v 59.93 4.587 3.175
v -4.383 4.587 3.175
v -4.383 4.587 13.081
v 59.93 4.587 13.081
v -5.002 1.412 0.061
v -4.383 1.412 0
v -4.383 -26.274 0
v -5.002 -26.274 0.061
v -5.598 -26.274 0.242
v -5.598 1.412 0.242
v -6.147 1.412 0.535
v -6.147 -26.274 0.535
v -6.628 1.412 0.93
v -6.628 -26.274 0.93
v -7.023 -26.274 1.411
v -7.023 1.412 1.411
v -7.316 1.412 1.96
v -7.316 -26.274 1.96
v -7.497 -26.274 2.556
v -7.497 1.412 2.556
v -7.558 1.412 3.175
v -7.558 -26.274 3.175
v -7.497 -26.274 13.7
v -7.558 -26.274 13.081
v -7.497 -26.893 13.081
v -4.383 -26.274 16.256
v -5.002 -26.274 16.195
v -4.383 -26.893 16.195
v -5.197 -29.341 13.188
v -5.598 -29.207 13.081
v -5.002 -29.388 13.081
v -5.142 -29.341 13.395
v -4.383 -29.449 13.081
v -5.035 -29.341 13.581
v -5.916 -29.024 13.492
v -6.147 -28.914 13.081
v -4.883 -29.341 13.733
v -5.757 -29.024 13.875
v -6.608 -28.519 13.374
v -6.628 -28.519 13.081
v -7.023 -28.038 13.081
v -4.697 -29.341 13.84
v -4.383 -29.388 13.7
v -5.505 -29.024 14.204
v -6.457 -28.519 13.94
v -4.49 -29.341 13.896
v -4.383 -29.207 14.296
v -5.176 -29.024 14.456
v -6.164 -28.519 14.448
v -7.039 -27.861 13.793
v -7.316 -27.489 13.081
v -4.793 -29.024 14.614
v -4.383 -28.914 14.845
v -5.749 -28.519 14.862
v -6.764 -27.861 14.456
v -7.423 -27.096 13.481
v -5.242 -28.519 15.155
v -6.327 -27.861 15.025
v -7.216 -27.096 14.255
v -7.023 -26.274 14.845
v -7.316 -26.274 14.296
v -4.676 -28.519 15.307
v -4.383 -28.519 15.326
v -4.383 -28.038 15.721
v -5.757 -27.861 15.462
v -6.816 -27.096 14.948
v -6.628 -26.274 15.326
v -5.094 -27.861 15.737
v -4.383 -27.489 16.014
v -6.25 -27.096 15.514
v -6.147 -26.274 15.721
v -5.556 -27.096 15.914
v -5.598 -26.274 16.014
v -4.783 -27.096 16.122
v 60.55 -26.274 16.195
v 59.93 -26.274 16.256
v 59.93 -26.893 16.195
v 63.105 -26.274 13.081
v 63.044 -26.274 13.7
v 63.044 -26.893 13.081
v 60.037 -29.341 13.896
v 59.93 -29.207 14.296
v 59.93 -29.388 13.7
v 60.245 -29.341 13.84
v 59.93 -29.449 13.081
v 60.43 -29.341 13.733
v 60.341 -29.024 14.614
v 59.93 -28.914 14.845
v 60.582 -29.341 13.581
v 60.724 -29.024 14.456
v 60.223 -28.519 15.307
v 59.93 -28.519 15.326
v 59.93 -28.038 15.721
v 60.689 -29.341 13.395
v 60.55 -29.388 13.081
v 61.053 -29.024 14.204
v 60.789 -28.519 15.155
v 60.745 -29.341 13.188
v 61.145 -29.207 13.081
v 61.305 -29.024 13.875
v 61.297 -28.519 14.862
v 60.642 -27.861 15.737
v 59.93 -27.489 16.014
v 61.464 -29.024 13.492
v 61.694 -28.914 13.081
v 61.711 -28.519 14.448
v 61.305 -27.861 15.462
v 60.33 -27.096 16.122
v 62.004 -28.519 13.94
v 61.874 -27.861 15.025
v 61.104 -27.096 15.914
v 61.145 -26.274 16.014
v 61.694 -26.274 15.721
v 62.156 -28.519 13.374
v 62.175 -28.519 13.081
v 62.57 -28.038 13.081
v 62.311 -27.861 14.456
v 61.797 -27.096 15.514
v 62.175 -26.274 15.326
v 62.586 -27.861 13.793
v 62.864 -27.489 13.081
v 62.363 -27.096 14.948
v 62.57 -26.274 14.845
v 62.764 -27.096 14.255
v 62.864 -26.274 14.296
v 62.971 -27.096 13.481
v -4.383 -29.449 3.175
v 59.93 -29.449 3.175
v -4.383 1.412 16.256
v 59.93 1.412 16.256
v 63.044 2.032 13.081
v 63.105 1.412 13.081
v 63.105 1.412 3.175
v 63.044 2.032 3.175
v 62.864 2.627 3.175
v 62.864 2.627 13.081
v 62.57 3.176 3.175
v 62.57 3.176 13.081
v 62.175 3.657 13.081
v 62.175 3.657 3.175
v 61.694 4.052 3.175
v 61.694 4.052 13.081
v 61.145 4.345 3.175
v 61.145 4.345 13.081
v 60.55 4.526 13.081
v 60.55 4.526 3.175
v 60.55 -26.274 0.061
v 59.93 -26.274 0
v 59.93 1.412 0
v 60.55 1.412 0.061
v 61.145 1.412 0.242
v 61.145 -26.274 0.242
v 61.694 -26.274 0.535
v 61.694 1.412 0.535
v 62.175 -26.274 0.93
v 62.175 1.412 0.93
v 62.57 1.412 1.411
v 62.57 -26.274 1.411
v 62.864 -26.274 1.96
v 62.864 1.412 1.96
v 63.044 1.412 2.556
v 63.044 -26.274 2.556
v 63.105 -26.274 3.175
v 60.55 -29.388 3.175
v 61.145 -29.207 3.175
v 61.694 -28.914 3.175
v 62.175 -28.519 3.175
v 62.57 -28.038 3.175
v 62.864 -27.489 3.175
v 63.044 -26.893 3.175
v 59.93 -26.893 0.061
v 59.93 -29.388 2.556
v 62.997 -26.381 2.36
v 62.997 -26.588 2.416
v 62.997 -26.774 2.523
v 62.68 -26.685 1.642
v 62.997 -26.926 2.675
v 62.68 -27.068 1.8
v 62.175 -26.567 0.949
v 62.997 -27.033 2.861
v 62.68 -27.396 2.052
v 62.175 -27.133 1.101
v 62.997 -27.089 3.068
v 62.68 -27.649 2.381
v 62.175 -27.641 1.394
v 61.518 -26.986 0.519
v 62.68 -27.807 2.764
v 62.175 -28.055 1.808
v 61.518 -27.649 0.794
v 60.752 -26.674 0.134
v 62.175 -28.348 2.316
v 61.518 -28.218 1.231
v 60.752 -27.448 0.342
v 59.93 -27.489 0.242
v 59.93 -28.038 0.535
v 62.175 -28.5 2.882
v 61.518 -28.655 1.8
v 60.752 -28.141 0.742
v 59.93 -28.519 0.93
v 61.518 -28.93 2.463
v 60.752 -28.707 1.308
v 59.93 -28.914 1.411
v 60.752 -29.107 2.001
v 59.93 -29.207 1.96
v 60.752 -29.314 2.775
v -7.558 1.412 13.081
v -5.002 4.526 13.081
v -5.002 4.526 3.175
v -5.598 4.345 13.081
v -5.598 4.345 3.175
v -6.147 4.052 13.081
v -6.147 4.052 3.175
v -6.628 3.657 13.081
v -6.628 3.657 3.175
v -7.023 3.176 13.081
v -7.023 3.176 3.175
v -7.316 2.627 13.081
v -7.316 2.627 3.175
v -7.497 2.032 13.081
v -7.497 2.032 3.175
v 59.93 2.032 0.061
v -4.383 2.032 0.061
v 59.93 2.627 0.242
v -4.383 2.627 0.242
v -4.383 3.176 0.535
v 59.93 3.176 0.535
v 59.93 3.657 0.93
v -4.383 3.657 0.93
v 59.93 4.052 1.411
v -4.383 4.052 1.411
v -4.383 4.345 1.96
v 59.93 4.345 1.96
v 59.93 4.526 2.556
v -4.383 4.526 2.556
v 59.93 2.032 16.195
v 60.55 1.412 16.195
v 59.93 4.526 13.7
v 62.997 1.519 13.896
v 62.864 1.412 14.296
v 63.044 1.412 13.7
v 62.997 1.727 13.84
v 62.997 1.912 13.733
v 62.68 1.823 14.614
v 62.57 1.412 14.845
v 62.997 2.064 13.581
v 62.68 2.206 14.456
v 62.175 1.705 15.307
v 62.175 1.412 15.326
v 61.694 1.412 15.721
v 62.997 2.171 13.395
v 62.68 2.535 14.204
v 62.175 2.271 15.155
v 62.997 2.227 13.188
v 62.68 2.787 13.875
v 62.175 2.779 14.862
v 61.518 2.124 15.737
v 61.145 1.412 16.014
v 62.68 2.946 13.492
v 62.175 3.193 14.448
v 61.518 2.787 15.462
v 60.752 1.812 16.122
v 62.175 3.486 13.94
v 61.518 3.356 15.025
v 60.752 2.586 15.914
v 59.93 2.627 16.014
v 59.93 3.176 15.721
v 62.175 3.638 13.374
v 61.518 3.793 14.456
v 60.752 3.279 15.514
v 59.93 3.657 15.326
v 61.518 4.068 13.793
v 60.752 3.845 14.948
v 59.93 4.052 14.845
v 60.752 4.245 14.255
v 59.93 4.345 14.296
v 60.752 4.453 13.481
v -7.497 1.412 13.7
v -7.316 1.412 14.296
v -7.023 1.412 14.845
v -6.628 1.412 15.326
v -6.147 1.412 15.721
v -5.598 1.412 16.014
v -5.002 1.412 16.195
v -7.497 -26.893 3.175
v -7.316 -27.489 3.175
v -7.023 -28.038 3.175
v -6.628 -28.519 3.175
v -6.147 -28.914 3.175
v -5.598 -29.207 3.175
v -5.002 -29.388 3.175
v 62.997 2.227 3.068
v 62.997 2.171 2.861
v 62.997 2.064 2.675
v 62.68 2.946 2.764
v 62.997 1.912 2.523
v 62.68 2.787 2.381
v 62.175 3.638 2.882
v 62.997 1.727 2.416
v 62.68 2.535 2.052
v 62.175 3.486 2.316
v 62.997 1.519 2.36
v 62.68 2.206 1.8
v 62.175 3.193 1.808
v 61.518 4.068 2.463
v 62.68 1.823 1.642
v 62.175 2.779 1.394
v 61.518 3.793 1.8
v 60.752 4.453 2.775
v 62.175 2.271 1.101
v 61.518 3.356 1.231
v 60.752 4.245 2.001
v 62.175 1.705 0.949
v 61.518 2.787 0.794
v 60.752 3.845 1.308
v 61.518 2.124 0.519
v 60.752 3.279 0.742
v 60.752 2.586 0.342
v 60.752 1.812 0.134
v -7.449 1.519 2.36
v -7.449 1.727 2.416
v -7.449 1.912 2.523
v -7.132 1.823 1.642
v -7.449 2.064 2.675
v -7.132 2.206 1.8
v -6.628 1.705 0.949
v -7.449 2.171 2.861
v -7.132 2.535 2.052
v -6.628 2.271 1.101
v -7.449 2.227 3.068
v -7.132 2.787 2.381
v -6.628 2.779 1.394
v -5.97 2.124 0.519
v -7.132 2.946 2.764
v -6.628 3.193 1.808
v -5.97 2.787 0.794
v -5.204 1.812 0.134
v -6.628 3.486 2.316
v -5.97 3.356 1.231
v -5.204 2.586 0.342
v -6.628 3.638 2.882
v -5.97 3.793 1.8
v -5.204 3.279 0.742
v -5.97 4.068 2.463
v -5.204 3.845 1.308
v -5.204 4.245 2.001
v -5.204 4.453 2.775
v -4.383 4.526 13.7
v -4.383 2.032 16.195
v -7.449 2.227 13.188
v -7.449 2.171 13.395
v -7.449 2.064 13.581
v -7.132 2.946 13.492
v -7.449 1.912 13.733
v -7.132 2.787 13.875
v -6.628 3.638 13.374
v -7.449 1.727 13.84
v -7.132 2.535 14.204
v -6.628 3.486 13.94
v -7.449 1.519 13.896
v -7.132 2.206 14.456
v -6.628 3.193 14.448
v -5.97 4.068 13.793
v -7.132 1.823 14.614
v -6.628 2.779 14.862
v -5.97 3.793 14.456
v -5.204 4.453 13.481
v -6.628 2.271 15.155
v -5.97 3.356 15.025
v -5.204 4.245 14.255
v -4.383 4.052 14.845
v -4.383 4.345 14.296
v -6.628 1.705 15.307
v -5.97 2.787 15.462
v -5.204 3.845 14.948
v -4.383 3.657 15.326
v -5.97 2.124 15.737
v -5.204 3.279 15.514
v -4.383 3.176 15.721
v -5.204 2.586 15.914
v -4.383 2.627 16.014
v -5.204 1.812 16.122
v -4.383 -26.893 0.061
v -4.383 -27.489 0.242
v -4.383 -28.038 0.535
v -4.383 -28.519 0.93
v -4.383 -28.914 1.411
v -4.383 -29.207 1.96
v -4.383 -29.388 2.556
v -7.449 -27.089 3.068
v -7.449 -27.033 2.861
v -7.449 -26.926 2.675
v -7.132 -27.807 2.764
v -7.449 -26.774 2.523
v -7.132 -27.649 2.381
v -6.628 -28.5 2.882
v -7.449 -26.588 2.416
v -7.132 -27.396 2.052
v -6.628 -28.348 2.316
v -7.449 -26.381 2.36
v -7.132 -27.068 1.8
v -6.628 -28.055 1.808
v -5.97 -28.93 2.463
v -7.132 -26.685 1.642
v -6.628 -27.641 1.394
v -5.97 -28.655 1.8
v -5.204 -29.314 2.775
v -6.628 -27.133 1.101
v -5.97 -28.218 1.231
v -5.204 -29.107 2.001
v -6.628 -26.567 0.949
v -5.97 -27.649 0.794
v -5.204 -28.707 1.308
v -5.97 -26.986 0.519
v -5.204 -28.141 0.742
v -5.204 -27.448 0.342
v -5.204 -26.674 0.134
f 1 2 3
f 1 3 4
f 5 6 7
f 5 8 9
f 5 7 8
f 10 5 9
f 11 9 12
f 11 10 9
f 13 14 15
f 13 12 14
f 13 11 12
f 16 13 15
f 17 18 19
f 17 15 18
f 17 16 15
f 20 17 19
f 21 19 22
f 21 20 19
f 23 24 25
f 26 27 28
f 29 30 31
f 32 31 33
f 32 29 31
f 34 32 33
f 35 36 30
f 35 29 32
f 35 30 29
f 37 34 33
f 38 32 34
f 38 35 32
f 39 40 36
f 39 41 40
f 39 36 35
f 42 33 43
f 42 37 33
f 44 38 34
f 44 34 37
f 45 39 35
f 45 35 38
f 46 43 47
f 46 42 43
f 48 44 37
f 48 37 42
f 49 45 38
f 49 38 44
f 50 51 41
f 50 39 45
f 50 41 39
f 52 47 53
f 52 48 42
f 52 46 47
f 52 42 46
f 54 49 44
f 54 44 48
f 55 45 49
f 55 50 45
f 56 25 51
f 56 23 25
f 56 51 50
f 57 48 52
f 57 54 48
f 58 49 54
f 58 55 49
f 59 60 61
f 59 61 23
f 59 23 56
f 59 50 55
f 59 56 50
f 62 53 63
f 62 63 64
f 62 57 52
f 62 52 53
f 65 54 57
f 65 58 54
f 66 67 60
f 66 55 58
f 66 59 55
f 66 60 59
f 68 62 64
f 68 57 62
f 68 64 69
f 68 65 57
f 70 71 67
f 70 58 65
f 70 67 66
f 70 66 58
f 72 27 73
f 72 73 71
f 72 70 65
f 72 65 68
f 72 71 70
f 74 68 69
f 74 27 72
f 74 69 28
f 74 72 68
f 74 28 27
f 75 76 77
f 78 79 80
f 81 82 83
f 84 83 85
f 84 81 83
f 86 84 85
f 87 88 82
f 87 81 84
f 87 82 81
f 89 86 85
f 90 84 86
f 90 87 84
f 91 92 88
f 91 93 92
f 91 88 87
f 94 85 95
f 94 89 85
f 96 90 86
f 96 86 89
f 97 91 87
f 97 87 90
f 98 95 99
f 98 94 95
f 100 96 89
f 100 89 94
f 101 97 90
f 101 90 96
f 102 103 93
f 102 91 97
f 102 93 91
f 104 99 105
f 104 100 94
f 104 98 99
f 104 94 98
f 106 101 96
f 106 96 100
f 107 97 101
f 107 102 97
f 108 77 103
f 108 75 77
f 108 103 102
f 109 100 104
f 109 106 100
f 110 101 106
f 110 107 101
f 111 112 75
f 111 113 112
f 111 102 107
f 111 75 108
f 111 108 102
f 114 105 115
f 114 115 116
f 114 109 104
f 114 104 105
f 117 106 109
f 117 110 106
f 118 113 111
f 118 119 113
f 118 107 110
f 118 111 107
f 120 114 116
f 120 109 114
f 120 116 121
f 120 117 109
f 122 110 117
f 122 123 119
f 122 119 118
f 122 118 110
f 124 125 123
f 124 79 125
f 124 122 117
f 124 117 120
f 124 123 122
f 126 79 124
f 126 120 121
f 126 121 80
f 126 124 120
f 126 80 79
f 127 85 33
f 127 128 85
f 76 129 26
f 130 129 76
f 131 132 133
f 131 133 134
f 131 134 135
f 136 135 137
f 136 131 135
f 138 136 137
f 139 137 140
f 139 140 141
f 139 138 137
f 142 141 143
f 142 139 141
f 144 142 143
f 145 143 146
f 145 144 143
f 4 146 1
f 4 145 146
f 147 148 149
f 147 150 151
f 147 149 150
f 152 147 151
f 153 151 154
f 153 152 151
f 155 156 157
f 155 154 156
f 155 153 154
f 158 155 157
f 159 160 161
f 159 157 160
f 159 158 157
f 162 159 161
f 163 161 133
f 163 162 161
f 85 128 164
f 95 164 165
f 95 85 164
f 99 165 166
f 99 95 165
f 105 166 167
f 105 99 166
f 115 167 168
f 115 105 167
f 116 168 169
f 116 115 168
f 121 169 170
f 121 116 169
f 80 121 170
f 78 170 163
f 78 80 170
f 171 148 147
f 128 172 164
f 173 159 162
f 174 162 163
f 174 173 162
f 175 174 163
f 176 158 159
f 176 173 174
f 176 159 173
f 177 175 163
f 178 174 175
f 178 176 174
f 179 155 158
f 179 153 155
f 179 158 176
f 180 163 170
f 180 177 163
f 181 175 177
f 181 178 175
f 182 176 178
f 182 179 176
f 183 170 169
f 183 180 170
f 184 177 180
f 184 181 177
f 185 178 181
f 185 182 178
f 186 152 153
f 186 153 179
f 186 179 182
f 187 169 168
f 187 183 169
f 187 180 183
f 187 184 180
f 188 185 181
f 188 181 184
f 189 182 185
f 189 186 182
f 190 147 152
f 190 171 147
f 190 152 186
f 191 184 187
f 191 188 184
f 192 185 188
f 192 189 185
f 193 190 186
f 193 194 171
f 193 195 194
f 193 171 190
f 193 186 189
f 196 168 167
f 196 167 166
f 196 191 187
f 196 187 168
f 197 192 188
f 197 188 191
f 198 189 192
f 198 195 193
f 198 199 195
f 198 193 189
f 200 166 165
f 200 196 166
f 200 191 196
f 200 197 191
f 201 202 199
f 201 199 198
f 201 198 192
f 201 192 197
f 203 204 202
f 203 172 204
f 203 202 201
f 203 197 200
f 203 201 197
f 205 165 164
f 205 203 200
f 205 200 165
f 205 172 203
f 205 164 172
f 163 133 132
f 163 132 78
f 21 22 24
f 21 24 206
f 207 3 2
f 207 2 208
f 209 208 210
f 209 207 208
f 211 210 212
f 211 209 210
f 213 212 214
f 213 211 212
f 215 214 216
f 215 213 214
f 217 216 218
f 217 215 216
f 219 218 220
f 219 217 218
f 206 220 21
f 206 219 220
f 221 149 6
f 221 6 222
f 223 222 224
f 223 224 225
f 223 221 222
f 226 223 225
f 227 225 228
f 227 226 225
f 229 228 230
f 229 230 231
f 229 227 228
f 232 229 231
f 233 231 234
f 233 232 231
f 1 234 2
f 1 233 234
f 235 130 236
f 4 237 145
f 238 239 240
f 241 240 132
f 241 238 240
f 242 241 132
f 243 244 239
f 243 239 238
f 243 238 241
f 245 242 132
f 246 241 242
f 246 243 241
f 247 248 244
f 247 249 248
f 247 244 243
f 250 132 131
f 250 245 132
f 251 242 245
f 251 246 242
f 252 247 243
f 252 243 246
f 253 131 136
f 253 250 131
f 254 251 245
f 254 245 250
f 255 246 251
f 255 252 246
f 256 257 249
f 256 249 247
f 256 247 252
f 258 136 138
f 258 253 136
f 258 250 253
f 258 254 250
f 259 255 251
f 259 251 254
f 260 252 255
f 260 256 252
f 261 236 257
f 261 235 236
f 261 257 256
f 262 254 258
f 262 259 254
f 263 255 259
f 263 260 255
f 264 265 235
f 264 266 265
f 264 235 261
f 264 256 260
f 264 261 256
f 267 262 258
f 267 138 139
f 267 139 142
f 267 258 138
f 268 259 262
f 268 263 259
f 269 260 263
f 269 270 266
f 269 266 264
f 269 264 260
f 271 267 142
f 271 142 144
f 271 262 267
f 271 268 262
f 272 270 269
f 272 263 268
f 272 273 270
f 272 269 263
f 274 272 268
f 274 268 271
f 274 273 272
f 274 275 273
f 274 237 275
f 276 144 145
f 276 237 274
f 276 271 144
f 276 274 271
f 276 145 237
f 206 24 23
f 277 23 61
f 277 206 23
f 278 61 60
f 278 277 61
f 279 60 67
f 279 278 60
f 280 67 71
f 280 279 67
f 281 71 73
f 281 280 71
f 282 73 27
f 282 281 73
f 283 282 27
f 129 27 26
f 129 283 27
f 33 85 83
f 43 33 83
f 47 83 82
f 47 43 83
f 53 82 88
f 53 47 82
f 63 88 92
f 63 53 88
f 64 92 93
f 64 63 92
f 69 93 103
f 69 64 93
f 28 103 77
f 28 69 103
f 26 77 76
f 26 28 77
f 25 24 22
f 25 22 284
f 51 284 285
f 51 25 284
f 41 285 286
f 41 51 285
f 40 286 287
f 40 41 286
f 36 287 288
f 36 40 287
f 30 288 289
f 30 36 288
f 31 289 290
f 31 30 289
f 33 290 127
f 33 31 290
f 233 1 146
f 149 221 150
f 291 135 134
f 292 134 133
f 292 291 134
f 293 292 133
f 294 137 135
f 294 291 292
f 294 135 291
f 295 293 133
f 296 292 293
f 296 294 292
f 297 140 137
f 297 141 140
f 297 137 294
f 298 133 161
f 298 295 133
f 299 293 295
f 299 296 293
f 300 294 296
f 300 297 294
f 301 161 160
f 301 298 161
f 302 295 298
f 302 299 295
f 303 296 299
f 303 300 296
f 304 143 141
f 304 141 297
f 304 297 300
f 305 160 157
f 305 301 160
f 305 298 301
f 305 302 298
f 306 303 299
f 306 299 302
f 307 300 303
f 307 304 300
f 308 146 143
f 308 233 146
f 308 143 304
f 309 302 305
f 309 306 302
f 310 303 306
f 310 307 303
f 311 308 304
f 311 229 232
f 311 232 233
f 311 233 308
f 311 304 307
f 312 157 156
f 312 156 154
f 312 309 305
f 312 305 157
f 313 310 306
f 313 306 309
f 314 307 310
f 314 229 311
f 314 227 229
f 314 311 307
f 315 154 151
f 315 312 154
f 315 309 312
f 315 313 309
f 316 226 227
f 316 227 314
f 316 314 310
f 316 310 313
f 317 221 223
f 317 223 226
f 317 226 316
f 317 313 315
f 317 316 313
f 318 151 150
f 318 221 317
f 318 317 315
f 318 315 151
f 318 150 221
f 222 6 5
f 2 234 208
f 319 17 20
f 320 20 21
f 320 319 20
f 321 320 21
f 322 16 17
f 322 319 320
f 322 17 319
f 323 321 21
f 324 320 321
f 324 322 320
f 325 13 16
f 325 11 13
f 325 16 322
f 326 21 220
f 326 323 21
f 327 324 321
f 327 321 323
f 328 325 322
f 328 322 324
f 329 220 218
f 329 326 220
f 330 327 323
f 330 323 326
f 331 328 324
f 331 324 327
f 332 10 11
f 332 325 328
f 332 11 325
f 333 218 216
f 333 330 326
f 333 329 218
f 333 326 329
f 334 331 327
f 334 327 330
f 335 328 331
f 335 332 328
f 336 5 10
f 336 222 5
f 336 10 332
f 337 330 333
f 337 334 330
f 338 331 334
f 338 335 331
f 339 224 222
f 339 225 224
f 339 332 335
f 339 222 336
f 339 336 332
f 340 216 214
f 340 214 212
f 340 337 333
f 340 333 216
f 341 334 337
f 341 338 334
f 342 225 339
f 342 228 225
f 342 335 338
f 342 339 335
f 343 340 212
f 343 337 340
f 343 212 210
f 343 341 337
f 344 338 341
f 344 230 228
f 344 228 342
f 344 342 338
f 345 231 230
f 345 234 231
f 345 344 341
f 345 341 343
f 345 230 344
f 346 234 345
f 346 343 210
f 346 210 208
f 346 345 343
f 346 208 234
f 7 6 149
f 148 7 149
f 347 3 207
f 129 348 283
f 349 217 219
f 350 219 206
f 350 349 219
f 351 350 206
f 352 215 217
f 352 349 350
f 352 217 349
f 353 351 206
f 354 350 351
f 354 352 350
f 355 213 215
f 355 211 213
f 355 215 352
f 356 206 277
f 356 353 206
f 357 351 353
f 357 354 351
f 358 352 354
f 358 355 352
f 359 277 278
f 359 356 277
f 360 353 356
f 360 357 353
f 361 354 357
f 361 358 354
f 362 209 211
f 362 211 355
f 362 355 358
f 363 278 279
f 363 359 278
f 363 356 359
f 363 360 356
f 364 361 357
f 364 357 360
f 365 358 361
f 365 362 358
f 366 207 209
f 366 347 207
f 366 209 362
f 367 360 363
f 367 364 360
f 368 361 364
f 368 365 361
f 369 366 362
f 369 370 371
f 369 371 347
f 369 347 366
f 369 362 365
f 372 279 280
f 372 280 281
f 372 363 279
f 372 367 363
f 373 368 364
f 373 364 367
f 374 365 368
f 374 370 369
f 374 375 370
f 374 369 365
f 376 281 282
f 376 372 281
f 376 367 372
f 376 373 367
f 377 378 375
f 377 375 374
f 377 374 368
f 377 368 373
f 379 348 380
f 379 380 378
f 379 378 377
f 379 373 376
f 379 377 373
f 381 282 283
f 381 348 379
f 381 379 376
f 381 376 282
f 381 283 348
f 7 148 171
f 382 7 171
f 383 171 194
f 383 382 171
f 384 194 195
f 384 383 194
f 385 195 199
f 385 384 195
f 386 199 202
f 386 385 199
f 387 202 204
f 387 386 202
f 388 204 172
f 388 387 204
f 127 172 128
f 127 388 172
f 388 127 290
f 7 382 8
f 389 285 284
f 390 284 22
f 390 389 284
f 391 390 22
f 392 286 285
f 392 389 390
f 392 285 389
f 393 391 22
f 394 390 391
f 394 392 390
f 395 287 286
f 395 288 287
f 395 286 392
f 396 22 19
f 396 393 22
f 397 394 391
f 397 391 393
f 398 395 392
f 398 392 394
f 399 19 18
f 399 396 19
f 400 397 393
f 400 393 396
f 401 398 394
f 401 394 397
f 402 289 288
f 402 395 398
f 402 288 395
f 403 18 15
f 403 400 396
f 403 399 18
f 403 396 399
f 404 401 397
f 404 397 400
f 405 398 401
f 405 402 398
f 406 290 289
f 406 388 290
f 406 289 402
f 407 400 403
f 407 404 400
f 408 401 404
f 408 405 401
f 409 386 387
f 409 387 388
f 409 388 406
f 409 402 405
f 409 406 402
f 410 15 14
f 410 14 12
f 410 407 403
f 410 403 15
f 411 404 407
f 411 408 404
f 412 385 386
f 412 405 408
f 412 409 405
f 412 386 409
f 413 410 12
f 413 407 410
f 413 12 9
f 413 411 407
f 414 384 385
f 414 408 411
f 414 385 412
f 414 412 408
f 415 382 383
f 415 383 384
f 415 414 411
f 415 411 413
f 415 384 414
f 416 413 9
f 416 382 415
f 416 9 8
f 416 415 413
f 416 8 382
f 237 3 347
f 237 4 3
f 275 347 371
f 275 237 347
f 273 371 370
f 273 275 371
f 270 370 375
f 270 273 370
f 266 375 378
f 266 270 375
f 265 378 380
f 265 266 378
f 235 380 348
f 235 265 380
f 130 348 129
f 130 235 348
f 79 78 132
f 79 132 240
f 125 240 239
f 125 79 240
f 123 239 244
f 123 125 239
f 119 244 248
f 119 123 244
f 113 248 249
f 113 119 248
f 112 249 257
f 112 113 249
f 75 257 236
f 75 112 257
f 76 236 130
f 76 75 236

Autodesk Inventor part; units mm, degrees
ref_plane "YZ Plane" through (0, 0, 0) normal (1, 0, 0) x (0, 1, 0)
ref_plane "XZ Plane" through (0, 0, 0) normal (0, 1, 0) x (-1, 0, 0)
ref_plane "XY Plane" through (0, 0, 0) normal (0, 0, 1) x (1, 0, 0)
sketch "Sketch1" plane through (0, 0, 0) normal (0, 0, 1) x (1, 0, 0)
  line L0 (-7.5576, 4.5871) -> (63.1052, 4.5871)
  line L1 (63.1052, 4.5871) -> (63.1052, -29.4489)
  line L2 (63.1052, -29.4489) -> (-7.5576, -29.4489)
  line L3 (-7.5576, -29.4489) -> (-7.5576, 4.5871)
  point P0 (0, 0)
  dimension "d0" = 70.6628
  dimension "d1" = 34.036
extrude "Extrusion1" add sketch "Sketch1" along normal blind 16.256
fillet "Fillet1" radius 3.175 12 edges at (27.7738, 4.5871, 16.256) (-7.5576, -12.4309, 16.256) (63.1052, -12.4309, 16.256) (27.7738, -29.4489, 16.256) (27.7738, 4.5871, 0) (27.7738, -29.4489, 0) (63.1052, -12.4309, 0) (-7.5576, -12.4309, 0) (-7.5576, -29.4489, 8.128) (-7.5576, 4.5871, 8.128) (63.1052, 4.5871, 8.128) (63.1052, -29.4489, 8.128)
properties part number "Battery"
